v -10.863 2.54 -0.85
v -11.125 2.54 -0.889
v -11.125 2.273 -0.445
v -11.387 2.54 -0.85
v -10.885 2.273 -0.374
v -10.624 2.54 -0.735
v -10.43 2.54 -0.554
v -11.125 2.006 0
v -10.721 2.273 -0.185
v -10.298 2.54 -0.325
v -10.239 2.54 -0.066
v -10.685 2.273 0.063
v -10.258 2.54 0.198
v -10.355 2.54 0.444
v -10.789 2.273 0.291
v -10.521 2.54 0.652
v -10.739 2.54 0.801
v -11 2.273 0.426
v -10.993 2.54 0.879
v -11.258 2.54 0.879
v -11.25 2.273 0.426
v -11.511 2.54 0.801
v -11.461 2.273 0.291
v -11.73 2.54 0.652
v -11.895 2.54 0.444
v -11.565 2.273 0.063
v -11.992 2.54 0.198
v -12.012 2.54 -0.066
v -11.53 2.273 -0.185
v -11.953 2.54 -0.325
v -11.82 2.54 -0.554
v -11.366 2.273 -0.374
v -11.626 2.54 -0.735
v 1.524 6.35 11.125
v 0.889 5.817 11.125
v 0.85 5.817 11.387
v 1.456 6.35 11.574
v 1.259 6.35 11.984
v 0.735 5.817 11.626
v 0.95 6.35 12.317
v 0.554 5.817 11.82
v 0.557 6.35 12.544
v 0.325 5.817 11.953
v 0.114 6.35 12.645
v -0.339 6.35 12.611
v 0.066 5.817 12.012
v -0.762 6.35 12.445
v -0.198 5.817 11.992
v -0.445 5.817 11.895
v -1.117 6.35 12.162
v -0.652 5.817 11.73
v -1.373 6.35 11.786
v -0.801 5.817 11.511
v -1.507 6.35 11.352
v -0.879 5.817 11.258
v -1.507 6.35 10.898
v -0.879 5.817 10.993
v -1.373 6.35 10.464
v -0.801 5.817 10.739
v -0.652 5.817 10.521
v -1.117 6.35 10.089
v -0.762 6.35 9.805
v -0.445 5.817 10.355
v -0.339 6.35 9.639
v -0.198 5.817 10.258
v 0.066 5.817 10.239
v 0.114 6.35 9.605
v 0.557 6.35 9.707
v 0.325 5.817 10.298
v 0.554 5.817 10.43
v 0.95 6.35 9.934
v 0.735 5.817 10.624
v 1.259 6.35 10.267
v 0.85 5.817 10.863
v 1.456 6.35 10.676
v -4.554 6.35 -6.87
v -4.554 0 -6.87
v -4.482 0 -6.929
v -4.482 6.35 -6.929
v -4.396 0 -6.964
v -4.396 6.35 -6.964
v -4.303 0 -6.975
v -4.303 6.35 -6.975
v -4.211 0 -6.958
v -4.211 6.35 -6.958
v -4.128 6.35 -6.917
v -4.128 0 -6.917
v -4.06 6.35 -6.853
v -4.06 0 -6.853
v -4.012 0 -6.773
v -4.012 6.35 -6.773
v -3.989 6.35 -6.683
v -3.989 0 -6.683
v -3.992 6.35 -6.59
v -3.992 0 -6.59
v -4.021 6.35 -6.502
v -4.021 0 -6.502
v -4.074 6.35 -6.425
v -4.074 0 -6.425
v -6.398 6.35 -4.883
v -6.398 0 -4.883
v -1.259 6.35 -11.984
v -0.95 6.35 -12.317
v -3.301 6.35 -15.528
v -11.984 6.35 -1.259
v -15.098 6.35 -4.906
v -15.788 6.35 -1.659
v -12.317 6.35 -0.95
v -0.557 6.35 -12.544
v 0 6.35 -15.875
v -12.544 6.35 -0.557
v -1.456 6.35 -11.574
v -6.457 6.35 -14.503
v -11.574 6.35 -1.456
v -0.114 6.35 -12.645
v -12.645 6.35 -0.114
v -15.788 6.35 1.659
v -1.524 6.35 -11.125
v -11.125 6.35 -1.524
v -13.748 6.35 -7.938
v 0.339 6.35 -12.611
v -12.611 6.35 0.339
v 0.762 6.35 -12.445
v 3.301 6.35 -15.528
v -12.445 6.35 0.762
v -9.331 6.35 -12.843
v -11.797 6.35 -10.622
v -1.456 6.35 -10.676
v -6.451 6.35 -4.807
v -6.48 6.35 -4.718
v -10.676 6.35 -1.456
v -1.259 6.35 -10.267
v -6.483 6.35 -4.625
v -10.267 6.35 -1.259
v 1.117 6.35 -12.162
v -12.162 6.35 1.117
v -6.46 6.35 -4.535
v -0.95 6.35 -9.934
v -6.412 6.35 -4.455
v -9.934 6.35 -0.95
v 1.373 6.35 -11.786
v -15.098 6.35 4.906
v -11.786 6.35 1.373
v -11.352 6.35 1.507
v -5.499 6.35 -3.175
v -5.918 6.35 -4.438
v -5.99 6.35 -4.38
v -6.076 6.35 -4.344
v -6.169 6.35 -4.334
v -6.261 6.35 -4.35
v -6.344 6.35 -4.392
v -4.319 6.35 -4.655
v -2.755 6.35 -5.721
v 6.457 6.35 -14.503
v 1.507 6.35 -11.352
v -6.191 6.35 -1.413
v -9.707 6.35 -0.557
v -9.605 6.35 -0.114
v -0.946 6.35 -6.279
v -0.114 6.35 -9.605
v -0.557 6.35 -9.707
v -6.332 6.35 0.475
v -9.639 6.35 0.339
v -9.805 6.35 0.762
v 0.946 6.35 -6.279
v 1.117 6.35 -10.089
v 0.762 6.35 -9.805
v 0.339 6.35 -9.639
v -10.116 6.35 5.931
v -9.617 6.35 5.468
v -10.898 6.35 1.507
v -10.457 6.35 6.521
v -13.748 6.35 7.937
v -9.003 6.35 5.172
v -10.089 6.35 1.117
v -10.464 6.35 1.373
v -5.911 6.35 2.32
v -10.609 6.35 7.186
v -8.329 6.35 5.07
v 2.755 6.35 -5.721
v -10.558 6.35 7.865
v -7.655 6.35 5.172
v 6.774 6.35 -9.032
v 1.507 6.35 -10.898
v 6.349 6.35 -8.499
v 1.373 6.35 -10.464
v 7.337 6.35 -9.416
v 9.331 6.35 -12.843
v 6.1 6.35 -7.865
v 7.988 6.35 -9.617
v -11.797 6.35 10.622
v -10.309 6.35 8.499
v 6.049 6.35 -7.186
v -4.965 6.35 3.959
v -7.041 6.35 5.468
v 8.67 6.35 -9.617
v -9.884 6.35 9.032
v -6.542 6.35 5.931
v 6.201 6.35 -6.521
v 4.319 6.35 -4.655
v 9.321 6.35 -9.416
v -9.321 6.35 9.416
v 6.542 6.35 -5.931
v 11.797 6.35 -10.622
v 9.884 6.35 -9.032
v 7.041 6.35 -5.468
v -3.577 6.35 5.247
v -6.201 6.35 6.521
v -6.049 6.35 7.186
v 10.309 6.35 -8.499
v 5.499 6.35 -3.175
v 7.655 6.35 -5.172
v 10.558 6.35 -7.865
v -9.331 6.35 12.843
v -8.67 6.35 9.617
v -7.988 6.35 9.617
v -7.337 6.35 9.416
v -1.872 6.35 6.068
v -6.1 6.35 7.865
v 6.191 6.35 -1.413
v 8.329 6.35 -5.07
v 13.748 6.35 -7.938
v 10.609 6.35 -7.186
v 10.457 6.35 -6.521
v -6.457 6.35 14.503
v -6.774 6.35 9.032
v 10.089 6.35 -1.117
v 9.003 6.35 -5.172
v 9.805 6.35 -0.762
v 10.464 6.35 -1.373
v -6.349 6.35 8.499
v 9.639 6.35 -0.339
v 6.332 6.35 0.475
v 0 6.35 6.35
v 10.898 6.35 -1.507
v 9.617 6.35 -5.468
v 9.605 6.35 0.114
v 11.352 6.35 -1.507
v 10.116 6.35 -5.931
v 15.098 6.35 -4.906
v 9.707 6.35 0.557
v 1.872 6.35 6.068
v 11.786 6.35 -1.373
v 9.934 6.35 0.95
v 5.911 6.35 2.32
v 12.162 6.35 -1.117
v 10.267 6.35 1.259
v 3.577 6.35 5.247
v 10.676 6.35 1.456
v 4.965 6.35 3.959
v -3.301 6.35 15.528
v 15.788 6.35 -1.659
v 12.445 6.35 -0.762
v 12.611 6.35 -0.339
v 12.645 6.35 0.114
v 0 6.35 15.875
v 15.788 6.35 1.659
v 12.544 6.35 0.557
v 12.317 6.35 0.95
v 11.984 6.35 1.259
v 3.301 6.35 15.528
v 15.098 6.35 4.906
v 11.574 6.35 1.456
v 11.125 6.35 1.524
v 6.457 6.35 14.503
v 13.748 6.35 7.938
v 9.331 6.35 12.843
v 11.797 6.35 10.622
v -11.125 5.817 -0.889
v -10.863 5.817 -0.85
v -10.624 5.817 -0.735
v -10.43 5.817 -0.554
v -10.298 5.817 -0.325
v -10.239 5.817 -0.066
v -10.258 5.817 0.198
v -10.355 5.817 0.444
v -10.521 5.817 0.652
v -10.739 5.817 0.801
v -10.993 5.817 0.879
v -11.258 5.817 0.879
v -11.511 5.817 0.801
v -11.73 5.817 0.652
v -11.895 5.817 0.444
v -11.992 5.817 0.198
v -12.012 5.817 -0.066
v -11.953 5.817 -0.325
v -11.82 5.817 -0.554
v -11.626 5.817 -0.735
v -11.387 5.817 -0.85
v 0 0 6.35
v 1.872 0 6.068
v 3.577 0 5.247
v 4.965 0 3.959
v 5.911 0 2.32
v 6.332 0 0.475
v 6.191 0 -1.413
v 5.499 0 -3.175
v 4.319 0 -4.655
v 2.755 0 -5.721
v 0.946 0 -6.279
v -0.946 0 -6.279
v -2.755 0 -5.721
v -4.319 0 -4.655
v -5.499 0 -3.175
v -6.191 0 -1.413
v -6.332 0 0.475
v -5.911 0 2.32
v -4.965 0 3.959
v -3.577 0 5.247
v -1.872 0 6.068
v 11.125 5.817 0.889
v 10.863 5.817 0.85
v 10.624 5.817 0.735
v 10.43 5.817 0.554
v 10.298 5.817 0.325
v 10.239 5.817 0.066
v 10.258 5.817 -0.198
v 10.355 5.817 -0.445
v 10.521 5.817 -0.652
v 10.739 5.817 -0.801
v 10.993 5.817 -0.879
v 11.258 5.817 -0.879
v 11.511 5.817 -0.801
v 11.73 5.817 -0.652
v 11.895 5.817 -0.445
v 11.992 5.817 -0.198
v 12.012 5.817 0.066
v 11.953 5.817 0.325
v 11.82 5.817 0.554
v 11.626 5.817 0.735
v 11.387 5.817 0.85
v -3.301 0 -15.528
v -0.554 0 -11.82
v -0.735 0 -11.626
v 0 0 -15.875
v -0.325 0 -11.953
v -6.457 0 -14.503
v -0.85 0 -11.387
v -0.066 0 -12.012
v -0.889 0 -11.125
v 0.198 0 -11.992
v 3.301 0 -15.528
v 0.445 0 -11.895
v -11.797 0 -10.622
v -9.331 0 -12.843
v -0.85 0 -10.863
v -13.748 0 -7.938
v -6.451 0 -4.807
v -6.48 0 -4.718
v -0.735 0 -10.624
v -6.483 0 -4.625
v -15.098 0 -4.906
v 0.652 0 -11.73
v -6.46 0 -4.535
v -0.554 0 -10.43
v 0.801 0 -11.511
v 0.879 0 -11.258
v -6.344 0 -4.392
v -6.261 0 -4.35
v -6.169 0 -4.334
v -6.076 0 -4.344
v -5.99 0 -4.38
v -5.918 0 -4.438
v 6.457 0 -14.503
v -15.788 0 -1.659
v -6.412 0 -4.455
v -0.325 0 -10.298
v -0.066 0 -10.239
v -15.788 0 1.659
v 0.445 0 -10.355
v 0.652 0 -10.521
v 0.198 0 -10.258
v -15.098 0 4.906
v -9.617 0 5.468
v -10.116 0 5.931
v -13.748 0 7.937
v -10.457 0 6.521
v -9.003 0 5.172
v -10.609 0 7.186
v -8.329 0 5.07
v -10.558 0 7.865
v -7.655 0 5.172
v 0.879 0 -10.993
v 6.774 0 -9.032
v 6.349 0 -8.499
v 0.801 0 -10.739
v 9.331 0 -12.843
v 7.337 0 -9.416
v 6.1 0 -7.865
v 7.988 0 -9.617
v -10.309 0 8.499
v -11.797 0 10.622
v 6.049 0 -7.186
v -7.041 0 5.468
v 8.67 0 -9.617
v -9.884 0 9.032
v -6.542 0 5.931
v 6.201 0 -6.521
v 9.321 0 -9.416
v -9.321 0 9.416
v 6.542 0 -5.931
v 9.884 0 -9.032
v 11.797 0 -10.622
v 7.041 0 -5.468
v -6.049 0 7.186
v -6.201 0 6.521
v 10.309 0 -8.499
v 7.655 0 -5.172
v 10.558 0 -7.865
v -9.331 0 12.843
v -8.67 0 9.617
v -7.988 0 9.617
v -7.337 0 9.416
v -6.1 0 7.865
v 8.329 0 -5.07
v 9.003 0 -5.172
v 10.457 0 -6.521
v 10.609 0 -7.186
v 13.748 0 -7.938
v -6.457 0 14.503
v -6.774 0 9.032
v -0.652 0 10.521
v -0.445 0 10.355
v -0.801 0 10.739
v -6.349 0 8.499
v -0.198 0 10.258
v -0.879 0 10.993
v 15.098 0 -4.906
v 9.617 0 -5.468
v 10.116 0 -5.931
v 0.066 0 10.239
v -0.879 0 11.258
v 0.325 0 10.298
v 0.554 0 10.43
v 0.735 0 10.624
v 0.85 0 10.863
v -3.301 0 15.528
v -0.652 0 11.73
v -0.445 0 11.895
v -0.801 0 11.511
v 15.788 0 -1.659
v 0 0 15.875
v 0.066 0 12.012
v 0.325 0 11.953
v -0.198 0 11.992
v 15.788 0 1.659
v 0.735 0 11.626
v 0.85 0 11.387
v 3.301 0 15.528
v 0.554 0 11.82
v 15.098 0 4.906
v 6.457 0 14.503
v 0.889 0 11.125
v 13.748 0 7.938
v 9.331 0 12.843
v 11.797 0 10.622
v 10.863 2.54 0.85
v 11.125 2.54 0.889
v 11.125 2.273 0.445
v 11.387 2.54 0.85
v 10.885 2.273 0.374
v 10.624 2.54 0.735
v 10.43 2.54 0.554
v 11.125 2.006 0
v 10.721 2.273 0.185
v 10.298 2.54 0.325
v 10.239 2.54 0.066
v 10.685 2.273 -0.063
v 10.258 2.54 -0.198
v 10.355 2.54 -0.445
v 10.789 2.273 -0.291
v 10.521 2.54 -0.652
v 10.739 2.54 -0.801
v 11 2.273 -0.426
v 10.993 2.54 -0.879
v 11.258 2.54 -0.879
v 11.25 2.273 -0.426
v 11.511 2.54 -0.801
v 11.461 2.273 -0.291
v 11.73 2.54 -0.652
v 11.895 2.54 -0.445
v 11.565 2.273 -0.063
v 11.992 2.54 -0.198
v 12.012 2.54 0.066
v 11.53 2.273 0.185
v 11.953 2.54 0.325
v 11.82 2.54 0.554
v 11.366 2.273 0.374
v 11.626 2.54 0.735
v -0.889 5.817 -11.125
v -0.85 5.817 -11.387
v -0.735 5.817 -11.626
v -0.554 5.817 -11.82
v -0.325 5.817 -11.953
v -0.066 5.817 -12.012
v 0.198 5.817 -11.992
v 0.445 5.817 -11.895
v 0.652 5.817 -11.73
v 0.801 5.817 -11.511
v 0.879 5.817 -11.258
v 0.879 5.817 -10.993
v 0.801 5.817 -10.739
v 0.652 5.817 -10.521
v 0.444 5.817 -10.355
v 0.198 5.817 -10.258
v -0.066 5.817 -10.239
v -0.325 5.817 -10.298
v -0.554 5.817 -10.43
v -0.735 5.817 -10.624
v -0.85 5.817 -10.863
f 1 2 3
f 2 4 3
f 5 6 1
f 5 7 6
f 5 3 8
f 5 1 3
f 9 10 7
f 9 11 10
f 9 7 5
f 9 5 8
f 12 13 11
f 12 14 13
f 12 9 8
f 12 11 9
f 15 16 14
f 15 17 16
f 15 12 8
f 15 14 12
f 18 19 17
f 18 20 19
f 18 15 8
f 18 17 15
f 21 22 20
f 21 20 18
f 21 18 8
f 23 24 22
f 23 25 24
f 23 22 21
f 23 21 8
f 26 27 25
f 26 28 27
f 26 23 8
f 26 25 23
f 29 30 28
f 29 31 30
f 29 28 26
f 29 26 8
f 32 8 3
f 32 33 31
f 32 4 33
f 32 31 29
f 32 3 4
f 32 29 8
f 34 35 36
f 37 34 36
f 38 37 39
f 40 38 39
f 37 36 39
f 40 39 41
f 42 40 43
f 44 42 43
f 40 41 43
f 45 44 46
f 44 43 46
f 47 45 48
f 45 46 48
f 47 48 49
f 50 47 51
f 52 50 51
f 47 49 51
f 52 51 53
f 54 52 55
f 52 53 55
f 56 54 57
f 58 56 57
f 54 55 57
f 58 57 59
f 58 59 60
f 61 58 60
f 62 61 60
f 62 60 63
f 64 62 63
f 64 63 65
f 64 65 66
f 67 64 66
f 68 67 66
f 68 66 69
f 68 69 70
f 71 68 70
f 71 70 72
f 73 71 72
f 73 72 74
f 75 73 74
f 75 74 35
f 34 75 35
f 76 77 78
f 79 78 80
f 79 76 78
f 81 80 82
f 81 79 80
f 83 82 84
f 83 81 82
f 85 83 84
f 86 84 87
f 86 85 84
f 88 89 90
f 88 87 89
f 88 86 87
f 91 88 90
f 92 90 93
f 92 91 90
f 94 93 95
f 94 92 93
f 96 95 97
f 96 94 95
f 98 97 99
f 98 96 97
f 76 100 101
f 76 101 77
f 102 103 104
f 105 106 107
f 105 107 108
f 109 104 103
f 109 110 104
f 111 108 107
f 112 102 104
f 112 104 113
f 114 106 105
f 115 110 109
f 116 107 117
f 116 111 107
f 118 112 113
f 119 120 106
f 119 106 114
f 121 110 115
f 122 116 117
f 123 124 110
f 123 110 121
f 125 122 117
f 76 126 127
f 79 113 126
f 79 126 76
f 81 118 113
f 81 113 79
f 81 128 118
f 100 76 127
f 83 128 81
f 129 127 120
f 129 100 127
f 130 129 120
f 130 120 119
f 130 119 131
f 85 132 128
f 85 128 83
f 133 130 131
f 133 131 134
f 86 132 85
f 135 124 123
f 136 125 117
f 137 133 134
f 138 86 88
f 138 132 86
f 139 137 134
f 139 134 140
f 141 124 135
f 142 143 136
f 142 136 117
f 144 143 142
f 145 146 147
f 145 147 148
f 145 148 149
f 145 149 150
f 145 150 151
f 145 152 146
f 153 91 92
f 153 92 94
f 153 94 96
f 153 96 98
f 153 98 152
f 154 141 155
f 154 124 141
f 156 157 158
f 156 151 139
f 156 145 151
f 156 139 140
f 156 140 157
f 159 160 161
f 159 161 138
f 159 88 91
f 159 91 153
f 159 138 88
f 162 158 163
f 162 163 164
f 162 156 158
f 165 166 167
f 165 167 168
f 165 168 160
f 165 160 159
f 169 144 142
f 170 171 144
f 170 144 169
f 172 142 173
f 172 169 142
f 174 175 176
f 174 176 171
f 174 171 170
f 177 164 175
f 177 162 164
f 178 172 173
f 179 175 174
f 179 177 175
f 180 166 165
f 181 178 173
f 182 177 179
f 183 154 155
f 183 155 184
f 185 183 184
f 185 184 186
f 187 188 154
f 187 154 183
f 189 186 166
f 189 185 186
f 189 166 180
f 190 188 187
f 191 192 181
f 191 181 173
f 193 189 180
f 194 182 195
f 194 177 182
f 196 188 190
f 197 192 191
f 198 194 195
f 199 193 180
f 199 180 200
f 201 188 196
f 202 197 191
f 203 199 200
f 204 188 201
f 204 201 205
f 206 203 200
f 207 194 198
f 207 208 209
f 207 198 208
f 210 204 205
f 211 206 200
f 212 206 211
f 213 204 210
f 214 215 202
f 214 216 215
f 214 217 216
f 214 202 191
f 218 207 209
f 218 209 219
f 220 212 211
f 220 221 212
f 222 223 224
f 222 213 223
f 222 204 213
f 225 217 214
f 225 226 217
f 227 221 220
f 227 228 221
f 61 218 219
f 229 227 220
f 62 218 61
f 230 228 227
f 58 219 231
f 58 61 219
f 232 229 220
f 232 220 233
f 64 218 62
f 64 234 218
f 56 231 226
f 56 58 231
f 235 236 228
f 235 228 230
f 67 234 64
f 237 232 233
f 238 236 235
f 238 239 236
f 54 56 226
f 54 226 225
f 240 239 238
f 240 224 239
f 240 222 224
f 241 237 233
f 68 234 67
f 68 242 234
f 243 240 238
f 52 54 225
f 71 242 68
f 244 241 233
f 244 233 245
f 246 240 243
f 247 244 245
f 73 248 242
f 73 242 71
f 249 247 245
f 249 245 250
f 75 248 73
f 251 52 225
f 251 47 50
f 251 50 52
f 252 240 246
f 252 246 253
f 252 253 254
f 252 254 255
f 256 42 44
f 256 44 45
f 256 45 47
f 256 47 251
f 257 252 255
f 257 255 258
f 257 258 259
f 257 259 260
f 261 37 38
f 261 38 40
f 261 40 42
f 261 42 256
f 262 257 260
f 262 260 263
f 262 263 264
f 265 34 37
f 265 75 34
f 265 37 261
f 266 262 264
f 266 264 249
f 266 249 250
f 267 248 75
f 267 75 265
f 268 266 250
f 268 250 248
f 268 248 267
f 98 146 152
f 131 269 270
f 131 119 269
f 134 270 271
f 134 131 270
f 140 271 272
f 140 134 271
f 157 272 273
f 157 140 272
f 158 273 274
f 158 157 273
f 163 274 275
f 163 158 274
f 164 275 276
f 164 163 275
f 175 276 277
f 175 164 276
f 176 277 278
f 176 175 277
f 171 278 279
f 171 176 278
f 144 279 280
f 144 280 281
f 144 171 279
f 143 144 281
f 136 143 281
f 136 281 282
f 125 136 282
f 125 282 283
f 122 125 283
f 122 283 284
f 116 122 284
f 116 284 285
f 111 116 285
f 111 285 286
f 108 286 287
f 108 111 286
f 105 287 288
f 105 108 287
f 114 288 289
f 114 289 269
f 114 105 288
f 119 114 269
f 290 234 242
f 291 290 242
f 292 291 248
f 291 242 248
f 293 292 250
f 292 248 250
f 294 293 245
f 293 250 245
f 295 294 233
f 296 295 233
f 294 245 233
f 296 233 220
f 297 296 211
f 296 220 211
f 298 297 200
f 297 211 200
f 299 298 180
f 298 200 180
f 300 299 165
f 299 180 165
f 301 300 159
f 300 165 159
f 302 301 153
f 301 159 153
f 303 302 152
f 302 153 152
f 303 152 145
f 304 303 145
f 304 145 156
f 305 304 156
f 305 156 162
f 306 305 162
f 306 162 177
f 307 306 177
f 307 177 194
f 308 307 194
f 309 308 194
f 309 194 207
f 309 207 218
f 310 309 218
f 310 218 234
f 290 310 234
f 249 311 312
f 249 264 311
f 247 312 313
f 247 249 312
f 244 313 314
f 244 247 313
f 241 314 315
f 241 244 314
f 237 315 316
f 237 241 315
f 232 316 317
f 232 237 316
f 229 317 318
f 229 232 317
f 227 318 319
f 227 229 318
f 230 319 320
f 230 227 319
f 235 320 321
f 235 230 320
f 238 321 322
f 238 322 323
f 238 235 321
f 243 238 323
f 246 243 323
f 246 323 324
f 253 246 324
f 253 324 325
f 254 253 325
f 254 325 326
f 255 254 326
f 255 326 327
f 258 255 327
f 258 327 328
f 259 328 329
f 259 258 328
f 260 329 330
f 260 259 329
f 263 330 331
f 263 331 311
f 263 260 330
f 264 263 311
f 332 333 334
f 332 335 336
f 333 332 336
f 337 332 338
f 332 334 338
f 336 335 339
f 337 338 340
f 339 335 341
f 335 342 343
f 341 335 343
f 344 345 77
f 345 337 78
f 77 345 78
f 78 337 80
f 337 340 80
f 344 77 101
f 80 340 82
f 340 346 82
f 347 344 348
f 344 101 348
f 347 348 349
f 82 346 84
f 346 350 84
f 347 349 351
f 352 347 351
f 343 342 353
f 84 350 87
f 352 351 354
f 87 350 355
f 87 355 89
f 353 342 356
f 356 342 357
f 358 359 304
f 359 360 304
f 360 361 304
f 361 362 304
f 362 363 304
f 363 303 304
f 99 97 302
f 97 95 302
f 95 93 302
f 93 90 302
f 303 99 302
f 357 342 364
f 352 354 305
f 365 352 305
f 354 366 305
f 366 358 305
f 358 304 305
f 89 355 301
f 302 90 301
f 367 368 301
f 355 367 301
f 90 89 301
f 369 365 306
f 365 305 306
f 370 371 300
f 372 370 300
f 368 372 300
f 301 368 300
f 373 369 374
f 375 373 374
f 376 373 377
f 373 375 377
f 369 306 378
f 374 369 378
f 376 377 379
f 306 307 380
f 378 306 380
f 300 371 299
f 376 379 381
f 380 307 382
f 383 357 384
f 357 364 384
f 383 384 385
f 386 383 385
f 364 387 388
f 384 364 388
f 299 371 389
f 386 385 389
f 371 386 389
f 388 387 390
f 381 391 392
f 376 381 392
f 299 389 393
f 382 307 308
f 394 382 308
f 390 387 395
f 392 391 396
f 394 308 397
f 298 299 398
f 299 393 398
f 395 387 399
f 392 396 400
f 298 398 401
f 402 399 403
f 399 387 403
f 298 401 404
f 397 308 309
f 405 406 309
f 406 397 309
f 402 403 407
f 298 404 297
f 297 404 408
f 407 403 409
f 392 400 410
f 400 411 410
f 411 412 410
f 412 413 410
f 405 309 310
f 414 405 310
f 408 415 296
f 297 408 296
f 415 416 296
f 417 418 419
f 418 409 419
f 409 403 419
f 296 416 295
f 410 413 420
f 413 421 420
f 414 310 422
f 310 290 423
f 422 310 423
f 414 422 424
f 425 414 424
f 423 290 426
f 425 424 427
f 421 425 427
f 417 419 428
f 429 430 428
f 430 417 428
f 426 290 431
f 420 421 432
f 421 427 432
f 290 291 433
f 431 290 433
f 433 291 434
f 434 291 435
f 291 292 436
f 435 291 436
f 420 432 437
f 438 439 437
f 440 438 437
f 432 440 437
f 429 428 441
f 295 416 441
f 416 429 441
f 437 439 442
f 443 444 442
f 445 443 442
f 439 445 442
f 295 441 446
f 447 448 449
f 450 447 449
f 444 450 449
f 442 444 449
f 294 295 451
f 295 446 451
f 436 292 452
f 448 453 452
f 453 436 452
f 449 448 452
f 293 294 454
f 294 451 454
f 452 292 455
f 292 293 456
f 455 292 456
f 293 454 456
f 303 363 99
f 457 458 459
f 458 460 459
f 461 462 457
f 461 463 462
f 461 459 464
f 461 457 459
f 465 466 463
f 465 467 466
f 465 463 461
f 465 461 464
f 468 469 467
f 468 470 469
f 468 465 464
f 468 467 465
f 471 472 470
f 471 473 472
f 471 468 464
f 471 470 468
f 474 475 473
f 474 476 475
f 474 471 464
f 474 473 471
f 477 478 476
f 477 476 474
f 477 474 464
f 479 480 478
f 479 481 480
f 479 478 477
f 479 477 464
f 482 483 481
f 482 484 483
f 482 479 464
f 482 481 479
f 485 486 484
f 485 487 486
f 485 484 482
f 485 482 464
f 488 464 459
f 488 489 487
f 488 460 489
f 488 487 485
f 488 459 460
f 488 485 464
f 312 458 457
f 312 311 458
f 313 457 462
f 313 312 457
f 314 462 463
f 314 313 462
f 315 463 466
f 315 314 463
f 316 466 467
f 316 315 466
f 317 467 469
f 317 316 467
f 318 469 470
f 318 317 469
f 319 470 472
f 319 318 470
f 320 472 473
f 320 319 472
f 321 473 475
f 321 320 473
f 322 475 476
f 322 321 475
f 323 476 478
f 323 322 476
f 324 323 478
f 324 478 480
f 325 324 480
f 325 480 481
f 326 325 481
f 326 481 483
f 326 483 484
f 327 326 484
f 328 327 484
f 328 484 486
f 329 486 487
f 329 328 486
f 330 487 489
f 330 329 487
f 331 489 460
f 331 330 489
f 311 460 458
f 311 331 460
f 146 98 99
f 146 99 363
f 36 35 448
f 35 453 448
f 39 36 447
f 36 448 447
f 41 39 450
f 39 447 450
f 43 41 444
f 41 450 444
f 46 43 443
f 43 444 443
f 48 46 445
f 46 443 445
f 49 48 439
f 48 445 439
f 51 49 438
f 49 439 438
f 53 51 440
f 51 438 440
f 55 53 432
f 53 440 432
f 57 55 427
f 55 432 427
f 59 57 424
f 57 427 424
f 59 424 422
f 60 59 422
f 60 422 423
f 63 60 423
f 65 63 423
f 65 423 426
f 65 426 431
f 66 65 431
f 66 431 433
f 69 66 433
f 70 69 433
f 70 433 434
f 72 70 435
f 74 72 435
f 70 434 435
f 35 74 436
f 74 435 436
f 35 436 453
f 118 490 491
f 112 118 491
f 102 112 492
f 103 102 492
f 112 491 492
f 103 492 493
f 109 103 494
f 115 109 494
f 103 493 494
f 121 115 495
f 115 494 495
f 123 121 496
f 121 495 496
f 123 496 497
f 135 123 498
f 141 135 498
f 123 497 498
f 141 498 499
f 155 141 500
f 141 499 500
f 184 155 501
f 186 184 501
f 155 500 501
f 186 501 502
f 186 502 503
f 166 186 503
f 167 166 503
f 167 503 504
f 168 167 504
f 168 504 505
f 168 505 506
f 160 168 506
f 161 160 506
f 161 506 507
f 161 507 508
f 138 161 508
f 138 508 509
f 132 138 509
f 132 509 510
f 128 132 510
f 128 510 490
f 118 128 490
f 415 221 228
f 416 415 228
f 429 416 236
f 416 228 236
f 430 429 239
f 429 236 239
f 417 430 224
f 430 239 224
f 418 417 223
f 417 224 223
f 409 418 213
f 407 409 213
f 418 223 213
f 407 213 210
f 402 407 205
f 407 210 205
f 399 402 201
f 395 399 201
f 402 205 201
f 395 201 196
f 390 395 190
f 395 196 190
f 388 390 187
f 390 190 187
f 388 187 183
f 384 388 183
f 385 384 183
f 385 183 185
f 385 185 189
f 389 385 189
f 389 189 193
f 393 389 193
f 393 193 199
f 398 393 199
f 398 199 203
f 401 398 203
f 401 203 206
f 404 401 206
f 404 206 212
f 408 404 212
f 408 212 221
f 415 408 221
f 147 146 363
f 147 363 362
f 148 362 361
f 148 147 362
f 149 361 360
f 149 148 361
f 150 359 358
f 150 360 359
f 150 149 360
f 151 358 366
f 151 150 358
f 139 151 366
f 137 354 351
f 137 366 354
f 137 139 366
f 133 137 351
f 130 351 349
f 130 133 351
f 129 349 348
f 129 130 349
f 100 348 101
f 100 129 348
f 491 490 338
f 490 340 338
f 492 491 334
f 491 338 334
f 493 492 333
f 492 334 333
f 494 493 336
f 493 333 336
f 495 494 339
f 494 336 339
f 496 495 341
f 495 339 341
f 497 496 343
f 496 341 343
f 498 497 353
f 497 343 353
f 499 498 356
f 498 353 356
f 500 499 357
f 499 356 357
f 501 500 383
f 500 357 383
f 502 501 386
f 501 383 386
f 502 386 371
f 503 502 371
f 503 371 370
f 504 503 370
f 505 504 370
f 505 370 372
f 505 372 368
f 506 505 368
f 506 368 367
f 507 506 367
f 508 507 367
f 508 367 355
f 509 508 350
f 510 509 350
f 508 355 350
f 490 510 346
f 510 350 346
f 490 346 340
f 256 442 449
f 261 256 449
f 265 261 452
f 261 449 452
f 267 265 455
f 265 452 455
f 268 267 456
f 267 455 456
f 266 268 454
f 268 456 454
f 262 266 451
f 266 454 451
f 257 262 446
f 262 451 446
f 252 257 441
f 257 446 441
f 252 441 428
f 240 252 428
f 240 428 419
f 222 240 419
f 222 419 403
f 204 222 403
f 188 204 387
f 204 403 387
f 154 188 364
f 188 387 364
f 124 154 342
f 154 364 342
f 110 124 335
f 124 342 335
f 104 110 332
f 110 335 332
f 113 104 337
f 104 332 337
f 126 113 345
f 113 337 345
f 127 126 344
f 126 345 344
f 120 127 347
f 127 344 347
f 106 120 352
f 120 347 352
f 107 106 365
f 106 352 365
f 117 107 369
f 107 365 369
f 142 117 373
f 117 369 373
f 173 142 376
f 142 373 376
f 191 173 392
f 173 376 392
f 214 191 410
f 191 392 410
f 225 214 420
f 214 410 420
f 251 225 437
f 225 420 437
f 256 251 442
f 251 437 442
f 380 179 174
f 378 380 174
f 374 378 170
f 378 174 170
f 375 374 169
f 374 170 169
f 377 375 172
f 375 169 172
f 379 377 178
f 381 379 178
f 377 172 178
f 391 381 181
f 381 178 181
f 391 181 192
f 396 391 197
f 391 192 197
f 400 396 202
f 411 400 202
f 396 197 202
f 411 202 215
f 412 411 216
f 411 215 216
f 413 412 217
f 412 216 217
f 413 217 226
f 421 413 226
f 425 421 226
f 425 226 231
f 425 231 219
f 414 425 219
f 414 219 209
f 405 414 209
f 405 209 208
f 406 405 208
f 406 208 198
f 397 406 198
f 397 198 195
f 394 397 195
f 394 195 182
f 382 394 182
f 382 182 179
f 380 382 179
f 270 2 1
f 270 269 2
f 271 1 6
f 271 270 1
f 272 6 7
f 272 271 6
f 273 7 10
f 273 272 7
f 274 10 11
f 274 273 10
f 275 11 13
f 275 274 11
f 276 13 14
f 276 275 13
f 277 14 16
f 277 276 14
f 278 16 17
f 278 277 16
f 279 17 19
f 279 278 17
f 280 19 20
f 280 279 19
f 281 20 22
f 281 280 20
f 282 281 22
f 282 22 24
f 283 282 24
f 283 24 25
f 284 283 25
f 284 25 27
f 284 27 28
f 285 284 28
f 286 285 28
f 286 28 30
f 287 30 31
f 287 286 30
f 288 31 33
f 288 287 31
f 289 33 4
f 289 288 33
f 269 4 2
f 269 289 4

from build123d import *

# Parameters (mm, degrees)
SKETCH1_R                           = 15.875
BOSS_EXTRUDE1_DEPTH                 = 6.35
SKETCH2_R                           = 6.35
CUT_EXTRUDE1_DEPTH                  = 24.3313898
TAP_DRILL_FOR_2_56_TAP2_D           = 1.778
TAP_DRILL_FOR_2_56_TAP2_CSINK_D     = 3.048
TAP_DRILL_FOR_2_56_TAP2_CSINK_ANGLE = 100
CIRPATTERN1_COUNT                   = 2
CIRPATTERN2_COUNT                   = 2
SKETCH11_R                          = 2.286
CUT_EXTRUDE2_DEPTH                  = 24.3313898
CIRPATTERN3_COUNT                   = 2
CUT_EXTRUDE3_DEPTH                  = 24.3313898


with BuildPart() as part:
    # Sketch1 → Boss-Extrude1 (new body)
    with BuildSketch(Plane(origin=(0, 0, 0), x_dir=(1, 0, 0), z_dir=(0, 1, 0))):
        with Locations(Location((0, 0, 0), (0, 0, 270))):
            Circle(SKETCH1_R)
    extrude(amount=BOSS_EXTRUDE1_DEPTH)

    # Sketch2 → Cut-Extrude1 (cut, through all)
    with BuildSketch(Plane(origin=(0, 6.35, 0), x_dir=(1, 0, 0), z_dir=(0, 1, 0))):
        with Locations(Location((0, 0, 0), (0, 0, 270))):
            Circle(SKETCH2_R)
    extrude(amount=-CUT_EXTRUDE1_DEPTH, mode=Mode.SUBTRACT)

    # Tap Drill for #2-56 Tap2 (through all)
    with Locations(Plane(origin=(0, 6.35, 0), x_dir=(1, 0, 0), z_dir=(0, 1, 0))):
        with Locations((0, 11.1252)):
            tap_drill_for_2_56_tap2 = CounterSinkHole(TAP_DRILL_FOR_2_56_TAP2_D / 2, TAP_DRILL_FOR_2_56_TAP2_CSINK_D / 2, counter_sink_angle=TAP_DRILL_FOR_2_56_TAP2_CSINK_ANGLE)

    # CirPattern1: Tap Drill for #2-56 Tap2 ×2 about axis
    cirpattern1_axis = Axis((0, 0, 0), (0, 1, 0))
    for i in range(1, CIRPATTERN1_COUNT):
        add(tap_drill_for_2_56_tap2.rotate(cirpattern1_axis, i * 360 / CIRPATTERN1_COUNT), mode=Mode.SUBTRACT)

    # Sketch10 → Tap Drill for #2-56 Tap1 (revolve, cut)
    with BuildSketch(Plane(origin=(11.1252, 6.35, 0), x_dir=(0, 0, 1), z_dir=(1, 0, 0))):
        Polygon((0, 0), (0, 4.34416509), (0.889, 3.81), (0.889, 0.532828266), (1.524, 0), align=None)
    tap_drill_for_2_56_tap1 = revolve(axis=Axis((11.1252, 12.7, 0), (0, -1, 0)), mode=Mode.SUBTRACT)

    # CirPattern2: Tap Drill for #2-56 Tap1 ×2 about axis
    cirpattern2_axis = Axis((0, 0, 0), (0, 1, 0))
    for i in range(1, CIRPATTERN2_COUNT):
        add(tap_drill_for_2_56_tap1.rotate(cirpattern2_axis, i * 360 / CIRPATTERN2_COUNT), mode=Mode.SUBTRACT)

    # Sketch11 → Cut-Extrude2 (cut, through all)
    with BuildSketch(Plane(origin=(0, 6.35, 0), x_dir=(1, 0, 0), z_dir=(0, 1, 0))):
        with Locations(Location((8.328911597, 7.35641814, 0), (0, 0, 270))):
            Circle(SKETCH11_R)
    cut_extrude2 = extrude(amount=-CUT_EXTRUDE2_DEPTH, mode=Mode.SUBTRACT)

    # CirPattern3: Cut-Extrude2 ×2 about axis
    cirpattern3_axis = Axis((0, 0, 0), (0, 1, 0))
    for i in range(1, CIRPATTERN3_COUNT):
        add(cut_extrude2.rotate(cirpattern3_axis, i * 360 / CIRPATTERN3_COUNT), mode=Mode.SUBTRACT)

    # Sketch12 → Cut-Extrude3 (cut, through all)
    with BuildSketch(Plane(origin=(0, 6.35, 0), x_dir=(1, 0, 0), z_dir=(0, 1, 0))):
        with BuildLine():
            Line((-6.39758264, 4.883452605), (-4.554151289, 6.87011727))
            ThreePointArc((-4.554151289, 6.87011727), (-4.0916663, 6.887412726), (-4.074370844, 6.424927737))
            Line((-4.074370844, 6.424927737), (-5.917802195, 4.438263073))
            ThreePointArc((-5.917802195, 4.438263073), (-6.380287183, 4.420967617), (-6.39758264, 4.883452605))
        make_face()
    extrude(amount=-CUT_EXTRUDE3_DEPTH, mode=Mode.SUBTRACT)


solid = part.part
